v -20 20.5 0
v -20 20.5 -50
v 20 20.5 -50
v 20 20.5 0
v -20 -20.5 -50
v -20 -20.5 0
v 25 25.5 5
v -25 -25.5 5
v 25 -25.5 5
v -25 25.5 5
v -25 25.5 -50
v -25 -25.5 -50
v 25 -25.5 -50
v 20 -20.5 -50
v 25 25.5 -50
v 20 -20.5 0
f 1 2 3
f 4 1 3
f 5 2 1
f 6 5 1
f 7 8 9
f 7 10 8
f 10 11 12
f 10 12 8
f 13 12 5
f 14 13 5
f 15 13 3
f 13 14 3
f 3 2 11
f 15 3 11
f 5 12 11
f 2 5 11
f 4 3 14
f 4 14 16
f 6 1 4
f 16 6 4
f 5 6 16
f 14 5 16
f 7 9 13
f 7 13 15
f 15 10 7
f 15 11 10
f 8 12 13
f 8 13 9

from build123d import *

# Parameters (mm, degrees)
SKETCH1_W           = 50
SKETCH1_H           = 51
BOSS_EXTRUDE2_DEPTH = 5
BOSS_EXTRUDE3_DEPTH = 5
SKETCH8_W           = 50
SKETCH8_H           = 55
BOSS_EXTRUDE4_DEPTH = 5
SKETCH13_W          = 55
SKETCH13_H          = 51
BOSS_EXTRUDE5_DEPTH = 5
SKETCH14_W          = 50
SKETCH14_H          = 55
BOSS_EXTRUDE6_DEPTH = 5


with BuildPart() as part:
    # Sketch1 → Boss-Extrude2 (new body)
    with BuildSketch(Plane.XY):
        Rectangle(SKETCH1_W, SKETCH1_H)
    extrude(amount=BOSS_EXTRUDE2_DEPTH)

    # Sketch3 → Boss-Extrude3 (add)
    with BuildSketch(Plane(origin=(25, 0, 0), x_dir=(0, 0, -1), z_dir=(1, 0, 0))):
        Polygon((-5, 25.5), (50, 25.5), (50, -25.5), (0, -25.5), (-5, -25.5), align=None)
    extrude(amount=-BOSS_EXTRUDE3_DEPTH)

    # Sketch8 → Boss-Extrude4 (add)
    with BuildSketch(Plane(origin=(0, 25.5, 0), x_dir=(1, 0, 0), z_dir=(0, 1, 0))):
        with Locations((0, 22.5)):
            Rectangle(SKETCH8_W, SKETCH8_H)
    extrude(amount=-BOSS_EXTRUDE4_DEPTH)

    # Sketch13 → Boss-Extrude5 (add)
    with BuildSketch(Plane.ZY.offset(25)):
        with Locations((-22.5, 0)):
            Rectangle(SKETCH13_W, SKETCH13_H)
    extrude(amount=-BOSS_EXTRUDE5_DEPTH)

    # Sketch14 → Boss-Extrude6 (add)
    with BuildSketch(Plane.XZ.offset(25.5)):
        with Locations((0, -22.5)):
            Rectangle(SKETCH14_W, SKETCH14_H)
    extrude(amount=-BOSS_EXTRUDE6_DEPTH)


solid = part.part
